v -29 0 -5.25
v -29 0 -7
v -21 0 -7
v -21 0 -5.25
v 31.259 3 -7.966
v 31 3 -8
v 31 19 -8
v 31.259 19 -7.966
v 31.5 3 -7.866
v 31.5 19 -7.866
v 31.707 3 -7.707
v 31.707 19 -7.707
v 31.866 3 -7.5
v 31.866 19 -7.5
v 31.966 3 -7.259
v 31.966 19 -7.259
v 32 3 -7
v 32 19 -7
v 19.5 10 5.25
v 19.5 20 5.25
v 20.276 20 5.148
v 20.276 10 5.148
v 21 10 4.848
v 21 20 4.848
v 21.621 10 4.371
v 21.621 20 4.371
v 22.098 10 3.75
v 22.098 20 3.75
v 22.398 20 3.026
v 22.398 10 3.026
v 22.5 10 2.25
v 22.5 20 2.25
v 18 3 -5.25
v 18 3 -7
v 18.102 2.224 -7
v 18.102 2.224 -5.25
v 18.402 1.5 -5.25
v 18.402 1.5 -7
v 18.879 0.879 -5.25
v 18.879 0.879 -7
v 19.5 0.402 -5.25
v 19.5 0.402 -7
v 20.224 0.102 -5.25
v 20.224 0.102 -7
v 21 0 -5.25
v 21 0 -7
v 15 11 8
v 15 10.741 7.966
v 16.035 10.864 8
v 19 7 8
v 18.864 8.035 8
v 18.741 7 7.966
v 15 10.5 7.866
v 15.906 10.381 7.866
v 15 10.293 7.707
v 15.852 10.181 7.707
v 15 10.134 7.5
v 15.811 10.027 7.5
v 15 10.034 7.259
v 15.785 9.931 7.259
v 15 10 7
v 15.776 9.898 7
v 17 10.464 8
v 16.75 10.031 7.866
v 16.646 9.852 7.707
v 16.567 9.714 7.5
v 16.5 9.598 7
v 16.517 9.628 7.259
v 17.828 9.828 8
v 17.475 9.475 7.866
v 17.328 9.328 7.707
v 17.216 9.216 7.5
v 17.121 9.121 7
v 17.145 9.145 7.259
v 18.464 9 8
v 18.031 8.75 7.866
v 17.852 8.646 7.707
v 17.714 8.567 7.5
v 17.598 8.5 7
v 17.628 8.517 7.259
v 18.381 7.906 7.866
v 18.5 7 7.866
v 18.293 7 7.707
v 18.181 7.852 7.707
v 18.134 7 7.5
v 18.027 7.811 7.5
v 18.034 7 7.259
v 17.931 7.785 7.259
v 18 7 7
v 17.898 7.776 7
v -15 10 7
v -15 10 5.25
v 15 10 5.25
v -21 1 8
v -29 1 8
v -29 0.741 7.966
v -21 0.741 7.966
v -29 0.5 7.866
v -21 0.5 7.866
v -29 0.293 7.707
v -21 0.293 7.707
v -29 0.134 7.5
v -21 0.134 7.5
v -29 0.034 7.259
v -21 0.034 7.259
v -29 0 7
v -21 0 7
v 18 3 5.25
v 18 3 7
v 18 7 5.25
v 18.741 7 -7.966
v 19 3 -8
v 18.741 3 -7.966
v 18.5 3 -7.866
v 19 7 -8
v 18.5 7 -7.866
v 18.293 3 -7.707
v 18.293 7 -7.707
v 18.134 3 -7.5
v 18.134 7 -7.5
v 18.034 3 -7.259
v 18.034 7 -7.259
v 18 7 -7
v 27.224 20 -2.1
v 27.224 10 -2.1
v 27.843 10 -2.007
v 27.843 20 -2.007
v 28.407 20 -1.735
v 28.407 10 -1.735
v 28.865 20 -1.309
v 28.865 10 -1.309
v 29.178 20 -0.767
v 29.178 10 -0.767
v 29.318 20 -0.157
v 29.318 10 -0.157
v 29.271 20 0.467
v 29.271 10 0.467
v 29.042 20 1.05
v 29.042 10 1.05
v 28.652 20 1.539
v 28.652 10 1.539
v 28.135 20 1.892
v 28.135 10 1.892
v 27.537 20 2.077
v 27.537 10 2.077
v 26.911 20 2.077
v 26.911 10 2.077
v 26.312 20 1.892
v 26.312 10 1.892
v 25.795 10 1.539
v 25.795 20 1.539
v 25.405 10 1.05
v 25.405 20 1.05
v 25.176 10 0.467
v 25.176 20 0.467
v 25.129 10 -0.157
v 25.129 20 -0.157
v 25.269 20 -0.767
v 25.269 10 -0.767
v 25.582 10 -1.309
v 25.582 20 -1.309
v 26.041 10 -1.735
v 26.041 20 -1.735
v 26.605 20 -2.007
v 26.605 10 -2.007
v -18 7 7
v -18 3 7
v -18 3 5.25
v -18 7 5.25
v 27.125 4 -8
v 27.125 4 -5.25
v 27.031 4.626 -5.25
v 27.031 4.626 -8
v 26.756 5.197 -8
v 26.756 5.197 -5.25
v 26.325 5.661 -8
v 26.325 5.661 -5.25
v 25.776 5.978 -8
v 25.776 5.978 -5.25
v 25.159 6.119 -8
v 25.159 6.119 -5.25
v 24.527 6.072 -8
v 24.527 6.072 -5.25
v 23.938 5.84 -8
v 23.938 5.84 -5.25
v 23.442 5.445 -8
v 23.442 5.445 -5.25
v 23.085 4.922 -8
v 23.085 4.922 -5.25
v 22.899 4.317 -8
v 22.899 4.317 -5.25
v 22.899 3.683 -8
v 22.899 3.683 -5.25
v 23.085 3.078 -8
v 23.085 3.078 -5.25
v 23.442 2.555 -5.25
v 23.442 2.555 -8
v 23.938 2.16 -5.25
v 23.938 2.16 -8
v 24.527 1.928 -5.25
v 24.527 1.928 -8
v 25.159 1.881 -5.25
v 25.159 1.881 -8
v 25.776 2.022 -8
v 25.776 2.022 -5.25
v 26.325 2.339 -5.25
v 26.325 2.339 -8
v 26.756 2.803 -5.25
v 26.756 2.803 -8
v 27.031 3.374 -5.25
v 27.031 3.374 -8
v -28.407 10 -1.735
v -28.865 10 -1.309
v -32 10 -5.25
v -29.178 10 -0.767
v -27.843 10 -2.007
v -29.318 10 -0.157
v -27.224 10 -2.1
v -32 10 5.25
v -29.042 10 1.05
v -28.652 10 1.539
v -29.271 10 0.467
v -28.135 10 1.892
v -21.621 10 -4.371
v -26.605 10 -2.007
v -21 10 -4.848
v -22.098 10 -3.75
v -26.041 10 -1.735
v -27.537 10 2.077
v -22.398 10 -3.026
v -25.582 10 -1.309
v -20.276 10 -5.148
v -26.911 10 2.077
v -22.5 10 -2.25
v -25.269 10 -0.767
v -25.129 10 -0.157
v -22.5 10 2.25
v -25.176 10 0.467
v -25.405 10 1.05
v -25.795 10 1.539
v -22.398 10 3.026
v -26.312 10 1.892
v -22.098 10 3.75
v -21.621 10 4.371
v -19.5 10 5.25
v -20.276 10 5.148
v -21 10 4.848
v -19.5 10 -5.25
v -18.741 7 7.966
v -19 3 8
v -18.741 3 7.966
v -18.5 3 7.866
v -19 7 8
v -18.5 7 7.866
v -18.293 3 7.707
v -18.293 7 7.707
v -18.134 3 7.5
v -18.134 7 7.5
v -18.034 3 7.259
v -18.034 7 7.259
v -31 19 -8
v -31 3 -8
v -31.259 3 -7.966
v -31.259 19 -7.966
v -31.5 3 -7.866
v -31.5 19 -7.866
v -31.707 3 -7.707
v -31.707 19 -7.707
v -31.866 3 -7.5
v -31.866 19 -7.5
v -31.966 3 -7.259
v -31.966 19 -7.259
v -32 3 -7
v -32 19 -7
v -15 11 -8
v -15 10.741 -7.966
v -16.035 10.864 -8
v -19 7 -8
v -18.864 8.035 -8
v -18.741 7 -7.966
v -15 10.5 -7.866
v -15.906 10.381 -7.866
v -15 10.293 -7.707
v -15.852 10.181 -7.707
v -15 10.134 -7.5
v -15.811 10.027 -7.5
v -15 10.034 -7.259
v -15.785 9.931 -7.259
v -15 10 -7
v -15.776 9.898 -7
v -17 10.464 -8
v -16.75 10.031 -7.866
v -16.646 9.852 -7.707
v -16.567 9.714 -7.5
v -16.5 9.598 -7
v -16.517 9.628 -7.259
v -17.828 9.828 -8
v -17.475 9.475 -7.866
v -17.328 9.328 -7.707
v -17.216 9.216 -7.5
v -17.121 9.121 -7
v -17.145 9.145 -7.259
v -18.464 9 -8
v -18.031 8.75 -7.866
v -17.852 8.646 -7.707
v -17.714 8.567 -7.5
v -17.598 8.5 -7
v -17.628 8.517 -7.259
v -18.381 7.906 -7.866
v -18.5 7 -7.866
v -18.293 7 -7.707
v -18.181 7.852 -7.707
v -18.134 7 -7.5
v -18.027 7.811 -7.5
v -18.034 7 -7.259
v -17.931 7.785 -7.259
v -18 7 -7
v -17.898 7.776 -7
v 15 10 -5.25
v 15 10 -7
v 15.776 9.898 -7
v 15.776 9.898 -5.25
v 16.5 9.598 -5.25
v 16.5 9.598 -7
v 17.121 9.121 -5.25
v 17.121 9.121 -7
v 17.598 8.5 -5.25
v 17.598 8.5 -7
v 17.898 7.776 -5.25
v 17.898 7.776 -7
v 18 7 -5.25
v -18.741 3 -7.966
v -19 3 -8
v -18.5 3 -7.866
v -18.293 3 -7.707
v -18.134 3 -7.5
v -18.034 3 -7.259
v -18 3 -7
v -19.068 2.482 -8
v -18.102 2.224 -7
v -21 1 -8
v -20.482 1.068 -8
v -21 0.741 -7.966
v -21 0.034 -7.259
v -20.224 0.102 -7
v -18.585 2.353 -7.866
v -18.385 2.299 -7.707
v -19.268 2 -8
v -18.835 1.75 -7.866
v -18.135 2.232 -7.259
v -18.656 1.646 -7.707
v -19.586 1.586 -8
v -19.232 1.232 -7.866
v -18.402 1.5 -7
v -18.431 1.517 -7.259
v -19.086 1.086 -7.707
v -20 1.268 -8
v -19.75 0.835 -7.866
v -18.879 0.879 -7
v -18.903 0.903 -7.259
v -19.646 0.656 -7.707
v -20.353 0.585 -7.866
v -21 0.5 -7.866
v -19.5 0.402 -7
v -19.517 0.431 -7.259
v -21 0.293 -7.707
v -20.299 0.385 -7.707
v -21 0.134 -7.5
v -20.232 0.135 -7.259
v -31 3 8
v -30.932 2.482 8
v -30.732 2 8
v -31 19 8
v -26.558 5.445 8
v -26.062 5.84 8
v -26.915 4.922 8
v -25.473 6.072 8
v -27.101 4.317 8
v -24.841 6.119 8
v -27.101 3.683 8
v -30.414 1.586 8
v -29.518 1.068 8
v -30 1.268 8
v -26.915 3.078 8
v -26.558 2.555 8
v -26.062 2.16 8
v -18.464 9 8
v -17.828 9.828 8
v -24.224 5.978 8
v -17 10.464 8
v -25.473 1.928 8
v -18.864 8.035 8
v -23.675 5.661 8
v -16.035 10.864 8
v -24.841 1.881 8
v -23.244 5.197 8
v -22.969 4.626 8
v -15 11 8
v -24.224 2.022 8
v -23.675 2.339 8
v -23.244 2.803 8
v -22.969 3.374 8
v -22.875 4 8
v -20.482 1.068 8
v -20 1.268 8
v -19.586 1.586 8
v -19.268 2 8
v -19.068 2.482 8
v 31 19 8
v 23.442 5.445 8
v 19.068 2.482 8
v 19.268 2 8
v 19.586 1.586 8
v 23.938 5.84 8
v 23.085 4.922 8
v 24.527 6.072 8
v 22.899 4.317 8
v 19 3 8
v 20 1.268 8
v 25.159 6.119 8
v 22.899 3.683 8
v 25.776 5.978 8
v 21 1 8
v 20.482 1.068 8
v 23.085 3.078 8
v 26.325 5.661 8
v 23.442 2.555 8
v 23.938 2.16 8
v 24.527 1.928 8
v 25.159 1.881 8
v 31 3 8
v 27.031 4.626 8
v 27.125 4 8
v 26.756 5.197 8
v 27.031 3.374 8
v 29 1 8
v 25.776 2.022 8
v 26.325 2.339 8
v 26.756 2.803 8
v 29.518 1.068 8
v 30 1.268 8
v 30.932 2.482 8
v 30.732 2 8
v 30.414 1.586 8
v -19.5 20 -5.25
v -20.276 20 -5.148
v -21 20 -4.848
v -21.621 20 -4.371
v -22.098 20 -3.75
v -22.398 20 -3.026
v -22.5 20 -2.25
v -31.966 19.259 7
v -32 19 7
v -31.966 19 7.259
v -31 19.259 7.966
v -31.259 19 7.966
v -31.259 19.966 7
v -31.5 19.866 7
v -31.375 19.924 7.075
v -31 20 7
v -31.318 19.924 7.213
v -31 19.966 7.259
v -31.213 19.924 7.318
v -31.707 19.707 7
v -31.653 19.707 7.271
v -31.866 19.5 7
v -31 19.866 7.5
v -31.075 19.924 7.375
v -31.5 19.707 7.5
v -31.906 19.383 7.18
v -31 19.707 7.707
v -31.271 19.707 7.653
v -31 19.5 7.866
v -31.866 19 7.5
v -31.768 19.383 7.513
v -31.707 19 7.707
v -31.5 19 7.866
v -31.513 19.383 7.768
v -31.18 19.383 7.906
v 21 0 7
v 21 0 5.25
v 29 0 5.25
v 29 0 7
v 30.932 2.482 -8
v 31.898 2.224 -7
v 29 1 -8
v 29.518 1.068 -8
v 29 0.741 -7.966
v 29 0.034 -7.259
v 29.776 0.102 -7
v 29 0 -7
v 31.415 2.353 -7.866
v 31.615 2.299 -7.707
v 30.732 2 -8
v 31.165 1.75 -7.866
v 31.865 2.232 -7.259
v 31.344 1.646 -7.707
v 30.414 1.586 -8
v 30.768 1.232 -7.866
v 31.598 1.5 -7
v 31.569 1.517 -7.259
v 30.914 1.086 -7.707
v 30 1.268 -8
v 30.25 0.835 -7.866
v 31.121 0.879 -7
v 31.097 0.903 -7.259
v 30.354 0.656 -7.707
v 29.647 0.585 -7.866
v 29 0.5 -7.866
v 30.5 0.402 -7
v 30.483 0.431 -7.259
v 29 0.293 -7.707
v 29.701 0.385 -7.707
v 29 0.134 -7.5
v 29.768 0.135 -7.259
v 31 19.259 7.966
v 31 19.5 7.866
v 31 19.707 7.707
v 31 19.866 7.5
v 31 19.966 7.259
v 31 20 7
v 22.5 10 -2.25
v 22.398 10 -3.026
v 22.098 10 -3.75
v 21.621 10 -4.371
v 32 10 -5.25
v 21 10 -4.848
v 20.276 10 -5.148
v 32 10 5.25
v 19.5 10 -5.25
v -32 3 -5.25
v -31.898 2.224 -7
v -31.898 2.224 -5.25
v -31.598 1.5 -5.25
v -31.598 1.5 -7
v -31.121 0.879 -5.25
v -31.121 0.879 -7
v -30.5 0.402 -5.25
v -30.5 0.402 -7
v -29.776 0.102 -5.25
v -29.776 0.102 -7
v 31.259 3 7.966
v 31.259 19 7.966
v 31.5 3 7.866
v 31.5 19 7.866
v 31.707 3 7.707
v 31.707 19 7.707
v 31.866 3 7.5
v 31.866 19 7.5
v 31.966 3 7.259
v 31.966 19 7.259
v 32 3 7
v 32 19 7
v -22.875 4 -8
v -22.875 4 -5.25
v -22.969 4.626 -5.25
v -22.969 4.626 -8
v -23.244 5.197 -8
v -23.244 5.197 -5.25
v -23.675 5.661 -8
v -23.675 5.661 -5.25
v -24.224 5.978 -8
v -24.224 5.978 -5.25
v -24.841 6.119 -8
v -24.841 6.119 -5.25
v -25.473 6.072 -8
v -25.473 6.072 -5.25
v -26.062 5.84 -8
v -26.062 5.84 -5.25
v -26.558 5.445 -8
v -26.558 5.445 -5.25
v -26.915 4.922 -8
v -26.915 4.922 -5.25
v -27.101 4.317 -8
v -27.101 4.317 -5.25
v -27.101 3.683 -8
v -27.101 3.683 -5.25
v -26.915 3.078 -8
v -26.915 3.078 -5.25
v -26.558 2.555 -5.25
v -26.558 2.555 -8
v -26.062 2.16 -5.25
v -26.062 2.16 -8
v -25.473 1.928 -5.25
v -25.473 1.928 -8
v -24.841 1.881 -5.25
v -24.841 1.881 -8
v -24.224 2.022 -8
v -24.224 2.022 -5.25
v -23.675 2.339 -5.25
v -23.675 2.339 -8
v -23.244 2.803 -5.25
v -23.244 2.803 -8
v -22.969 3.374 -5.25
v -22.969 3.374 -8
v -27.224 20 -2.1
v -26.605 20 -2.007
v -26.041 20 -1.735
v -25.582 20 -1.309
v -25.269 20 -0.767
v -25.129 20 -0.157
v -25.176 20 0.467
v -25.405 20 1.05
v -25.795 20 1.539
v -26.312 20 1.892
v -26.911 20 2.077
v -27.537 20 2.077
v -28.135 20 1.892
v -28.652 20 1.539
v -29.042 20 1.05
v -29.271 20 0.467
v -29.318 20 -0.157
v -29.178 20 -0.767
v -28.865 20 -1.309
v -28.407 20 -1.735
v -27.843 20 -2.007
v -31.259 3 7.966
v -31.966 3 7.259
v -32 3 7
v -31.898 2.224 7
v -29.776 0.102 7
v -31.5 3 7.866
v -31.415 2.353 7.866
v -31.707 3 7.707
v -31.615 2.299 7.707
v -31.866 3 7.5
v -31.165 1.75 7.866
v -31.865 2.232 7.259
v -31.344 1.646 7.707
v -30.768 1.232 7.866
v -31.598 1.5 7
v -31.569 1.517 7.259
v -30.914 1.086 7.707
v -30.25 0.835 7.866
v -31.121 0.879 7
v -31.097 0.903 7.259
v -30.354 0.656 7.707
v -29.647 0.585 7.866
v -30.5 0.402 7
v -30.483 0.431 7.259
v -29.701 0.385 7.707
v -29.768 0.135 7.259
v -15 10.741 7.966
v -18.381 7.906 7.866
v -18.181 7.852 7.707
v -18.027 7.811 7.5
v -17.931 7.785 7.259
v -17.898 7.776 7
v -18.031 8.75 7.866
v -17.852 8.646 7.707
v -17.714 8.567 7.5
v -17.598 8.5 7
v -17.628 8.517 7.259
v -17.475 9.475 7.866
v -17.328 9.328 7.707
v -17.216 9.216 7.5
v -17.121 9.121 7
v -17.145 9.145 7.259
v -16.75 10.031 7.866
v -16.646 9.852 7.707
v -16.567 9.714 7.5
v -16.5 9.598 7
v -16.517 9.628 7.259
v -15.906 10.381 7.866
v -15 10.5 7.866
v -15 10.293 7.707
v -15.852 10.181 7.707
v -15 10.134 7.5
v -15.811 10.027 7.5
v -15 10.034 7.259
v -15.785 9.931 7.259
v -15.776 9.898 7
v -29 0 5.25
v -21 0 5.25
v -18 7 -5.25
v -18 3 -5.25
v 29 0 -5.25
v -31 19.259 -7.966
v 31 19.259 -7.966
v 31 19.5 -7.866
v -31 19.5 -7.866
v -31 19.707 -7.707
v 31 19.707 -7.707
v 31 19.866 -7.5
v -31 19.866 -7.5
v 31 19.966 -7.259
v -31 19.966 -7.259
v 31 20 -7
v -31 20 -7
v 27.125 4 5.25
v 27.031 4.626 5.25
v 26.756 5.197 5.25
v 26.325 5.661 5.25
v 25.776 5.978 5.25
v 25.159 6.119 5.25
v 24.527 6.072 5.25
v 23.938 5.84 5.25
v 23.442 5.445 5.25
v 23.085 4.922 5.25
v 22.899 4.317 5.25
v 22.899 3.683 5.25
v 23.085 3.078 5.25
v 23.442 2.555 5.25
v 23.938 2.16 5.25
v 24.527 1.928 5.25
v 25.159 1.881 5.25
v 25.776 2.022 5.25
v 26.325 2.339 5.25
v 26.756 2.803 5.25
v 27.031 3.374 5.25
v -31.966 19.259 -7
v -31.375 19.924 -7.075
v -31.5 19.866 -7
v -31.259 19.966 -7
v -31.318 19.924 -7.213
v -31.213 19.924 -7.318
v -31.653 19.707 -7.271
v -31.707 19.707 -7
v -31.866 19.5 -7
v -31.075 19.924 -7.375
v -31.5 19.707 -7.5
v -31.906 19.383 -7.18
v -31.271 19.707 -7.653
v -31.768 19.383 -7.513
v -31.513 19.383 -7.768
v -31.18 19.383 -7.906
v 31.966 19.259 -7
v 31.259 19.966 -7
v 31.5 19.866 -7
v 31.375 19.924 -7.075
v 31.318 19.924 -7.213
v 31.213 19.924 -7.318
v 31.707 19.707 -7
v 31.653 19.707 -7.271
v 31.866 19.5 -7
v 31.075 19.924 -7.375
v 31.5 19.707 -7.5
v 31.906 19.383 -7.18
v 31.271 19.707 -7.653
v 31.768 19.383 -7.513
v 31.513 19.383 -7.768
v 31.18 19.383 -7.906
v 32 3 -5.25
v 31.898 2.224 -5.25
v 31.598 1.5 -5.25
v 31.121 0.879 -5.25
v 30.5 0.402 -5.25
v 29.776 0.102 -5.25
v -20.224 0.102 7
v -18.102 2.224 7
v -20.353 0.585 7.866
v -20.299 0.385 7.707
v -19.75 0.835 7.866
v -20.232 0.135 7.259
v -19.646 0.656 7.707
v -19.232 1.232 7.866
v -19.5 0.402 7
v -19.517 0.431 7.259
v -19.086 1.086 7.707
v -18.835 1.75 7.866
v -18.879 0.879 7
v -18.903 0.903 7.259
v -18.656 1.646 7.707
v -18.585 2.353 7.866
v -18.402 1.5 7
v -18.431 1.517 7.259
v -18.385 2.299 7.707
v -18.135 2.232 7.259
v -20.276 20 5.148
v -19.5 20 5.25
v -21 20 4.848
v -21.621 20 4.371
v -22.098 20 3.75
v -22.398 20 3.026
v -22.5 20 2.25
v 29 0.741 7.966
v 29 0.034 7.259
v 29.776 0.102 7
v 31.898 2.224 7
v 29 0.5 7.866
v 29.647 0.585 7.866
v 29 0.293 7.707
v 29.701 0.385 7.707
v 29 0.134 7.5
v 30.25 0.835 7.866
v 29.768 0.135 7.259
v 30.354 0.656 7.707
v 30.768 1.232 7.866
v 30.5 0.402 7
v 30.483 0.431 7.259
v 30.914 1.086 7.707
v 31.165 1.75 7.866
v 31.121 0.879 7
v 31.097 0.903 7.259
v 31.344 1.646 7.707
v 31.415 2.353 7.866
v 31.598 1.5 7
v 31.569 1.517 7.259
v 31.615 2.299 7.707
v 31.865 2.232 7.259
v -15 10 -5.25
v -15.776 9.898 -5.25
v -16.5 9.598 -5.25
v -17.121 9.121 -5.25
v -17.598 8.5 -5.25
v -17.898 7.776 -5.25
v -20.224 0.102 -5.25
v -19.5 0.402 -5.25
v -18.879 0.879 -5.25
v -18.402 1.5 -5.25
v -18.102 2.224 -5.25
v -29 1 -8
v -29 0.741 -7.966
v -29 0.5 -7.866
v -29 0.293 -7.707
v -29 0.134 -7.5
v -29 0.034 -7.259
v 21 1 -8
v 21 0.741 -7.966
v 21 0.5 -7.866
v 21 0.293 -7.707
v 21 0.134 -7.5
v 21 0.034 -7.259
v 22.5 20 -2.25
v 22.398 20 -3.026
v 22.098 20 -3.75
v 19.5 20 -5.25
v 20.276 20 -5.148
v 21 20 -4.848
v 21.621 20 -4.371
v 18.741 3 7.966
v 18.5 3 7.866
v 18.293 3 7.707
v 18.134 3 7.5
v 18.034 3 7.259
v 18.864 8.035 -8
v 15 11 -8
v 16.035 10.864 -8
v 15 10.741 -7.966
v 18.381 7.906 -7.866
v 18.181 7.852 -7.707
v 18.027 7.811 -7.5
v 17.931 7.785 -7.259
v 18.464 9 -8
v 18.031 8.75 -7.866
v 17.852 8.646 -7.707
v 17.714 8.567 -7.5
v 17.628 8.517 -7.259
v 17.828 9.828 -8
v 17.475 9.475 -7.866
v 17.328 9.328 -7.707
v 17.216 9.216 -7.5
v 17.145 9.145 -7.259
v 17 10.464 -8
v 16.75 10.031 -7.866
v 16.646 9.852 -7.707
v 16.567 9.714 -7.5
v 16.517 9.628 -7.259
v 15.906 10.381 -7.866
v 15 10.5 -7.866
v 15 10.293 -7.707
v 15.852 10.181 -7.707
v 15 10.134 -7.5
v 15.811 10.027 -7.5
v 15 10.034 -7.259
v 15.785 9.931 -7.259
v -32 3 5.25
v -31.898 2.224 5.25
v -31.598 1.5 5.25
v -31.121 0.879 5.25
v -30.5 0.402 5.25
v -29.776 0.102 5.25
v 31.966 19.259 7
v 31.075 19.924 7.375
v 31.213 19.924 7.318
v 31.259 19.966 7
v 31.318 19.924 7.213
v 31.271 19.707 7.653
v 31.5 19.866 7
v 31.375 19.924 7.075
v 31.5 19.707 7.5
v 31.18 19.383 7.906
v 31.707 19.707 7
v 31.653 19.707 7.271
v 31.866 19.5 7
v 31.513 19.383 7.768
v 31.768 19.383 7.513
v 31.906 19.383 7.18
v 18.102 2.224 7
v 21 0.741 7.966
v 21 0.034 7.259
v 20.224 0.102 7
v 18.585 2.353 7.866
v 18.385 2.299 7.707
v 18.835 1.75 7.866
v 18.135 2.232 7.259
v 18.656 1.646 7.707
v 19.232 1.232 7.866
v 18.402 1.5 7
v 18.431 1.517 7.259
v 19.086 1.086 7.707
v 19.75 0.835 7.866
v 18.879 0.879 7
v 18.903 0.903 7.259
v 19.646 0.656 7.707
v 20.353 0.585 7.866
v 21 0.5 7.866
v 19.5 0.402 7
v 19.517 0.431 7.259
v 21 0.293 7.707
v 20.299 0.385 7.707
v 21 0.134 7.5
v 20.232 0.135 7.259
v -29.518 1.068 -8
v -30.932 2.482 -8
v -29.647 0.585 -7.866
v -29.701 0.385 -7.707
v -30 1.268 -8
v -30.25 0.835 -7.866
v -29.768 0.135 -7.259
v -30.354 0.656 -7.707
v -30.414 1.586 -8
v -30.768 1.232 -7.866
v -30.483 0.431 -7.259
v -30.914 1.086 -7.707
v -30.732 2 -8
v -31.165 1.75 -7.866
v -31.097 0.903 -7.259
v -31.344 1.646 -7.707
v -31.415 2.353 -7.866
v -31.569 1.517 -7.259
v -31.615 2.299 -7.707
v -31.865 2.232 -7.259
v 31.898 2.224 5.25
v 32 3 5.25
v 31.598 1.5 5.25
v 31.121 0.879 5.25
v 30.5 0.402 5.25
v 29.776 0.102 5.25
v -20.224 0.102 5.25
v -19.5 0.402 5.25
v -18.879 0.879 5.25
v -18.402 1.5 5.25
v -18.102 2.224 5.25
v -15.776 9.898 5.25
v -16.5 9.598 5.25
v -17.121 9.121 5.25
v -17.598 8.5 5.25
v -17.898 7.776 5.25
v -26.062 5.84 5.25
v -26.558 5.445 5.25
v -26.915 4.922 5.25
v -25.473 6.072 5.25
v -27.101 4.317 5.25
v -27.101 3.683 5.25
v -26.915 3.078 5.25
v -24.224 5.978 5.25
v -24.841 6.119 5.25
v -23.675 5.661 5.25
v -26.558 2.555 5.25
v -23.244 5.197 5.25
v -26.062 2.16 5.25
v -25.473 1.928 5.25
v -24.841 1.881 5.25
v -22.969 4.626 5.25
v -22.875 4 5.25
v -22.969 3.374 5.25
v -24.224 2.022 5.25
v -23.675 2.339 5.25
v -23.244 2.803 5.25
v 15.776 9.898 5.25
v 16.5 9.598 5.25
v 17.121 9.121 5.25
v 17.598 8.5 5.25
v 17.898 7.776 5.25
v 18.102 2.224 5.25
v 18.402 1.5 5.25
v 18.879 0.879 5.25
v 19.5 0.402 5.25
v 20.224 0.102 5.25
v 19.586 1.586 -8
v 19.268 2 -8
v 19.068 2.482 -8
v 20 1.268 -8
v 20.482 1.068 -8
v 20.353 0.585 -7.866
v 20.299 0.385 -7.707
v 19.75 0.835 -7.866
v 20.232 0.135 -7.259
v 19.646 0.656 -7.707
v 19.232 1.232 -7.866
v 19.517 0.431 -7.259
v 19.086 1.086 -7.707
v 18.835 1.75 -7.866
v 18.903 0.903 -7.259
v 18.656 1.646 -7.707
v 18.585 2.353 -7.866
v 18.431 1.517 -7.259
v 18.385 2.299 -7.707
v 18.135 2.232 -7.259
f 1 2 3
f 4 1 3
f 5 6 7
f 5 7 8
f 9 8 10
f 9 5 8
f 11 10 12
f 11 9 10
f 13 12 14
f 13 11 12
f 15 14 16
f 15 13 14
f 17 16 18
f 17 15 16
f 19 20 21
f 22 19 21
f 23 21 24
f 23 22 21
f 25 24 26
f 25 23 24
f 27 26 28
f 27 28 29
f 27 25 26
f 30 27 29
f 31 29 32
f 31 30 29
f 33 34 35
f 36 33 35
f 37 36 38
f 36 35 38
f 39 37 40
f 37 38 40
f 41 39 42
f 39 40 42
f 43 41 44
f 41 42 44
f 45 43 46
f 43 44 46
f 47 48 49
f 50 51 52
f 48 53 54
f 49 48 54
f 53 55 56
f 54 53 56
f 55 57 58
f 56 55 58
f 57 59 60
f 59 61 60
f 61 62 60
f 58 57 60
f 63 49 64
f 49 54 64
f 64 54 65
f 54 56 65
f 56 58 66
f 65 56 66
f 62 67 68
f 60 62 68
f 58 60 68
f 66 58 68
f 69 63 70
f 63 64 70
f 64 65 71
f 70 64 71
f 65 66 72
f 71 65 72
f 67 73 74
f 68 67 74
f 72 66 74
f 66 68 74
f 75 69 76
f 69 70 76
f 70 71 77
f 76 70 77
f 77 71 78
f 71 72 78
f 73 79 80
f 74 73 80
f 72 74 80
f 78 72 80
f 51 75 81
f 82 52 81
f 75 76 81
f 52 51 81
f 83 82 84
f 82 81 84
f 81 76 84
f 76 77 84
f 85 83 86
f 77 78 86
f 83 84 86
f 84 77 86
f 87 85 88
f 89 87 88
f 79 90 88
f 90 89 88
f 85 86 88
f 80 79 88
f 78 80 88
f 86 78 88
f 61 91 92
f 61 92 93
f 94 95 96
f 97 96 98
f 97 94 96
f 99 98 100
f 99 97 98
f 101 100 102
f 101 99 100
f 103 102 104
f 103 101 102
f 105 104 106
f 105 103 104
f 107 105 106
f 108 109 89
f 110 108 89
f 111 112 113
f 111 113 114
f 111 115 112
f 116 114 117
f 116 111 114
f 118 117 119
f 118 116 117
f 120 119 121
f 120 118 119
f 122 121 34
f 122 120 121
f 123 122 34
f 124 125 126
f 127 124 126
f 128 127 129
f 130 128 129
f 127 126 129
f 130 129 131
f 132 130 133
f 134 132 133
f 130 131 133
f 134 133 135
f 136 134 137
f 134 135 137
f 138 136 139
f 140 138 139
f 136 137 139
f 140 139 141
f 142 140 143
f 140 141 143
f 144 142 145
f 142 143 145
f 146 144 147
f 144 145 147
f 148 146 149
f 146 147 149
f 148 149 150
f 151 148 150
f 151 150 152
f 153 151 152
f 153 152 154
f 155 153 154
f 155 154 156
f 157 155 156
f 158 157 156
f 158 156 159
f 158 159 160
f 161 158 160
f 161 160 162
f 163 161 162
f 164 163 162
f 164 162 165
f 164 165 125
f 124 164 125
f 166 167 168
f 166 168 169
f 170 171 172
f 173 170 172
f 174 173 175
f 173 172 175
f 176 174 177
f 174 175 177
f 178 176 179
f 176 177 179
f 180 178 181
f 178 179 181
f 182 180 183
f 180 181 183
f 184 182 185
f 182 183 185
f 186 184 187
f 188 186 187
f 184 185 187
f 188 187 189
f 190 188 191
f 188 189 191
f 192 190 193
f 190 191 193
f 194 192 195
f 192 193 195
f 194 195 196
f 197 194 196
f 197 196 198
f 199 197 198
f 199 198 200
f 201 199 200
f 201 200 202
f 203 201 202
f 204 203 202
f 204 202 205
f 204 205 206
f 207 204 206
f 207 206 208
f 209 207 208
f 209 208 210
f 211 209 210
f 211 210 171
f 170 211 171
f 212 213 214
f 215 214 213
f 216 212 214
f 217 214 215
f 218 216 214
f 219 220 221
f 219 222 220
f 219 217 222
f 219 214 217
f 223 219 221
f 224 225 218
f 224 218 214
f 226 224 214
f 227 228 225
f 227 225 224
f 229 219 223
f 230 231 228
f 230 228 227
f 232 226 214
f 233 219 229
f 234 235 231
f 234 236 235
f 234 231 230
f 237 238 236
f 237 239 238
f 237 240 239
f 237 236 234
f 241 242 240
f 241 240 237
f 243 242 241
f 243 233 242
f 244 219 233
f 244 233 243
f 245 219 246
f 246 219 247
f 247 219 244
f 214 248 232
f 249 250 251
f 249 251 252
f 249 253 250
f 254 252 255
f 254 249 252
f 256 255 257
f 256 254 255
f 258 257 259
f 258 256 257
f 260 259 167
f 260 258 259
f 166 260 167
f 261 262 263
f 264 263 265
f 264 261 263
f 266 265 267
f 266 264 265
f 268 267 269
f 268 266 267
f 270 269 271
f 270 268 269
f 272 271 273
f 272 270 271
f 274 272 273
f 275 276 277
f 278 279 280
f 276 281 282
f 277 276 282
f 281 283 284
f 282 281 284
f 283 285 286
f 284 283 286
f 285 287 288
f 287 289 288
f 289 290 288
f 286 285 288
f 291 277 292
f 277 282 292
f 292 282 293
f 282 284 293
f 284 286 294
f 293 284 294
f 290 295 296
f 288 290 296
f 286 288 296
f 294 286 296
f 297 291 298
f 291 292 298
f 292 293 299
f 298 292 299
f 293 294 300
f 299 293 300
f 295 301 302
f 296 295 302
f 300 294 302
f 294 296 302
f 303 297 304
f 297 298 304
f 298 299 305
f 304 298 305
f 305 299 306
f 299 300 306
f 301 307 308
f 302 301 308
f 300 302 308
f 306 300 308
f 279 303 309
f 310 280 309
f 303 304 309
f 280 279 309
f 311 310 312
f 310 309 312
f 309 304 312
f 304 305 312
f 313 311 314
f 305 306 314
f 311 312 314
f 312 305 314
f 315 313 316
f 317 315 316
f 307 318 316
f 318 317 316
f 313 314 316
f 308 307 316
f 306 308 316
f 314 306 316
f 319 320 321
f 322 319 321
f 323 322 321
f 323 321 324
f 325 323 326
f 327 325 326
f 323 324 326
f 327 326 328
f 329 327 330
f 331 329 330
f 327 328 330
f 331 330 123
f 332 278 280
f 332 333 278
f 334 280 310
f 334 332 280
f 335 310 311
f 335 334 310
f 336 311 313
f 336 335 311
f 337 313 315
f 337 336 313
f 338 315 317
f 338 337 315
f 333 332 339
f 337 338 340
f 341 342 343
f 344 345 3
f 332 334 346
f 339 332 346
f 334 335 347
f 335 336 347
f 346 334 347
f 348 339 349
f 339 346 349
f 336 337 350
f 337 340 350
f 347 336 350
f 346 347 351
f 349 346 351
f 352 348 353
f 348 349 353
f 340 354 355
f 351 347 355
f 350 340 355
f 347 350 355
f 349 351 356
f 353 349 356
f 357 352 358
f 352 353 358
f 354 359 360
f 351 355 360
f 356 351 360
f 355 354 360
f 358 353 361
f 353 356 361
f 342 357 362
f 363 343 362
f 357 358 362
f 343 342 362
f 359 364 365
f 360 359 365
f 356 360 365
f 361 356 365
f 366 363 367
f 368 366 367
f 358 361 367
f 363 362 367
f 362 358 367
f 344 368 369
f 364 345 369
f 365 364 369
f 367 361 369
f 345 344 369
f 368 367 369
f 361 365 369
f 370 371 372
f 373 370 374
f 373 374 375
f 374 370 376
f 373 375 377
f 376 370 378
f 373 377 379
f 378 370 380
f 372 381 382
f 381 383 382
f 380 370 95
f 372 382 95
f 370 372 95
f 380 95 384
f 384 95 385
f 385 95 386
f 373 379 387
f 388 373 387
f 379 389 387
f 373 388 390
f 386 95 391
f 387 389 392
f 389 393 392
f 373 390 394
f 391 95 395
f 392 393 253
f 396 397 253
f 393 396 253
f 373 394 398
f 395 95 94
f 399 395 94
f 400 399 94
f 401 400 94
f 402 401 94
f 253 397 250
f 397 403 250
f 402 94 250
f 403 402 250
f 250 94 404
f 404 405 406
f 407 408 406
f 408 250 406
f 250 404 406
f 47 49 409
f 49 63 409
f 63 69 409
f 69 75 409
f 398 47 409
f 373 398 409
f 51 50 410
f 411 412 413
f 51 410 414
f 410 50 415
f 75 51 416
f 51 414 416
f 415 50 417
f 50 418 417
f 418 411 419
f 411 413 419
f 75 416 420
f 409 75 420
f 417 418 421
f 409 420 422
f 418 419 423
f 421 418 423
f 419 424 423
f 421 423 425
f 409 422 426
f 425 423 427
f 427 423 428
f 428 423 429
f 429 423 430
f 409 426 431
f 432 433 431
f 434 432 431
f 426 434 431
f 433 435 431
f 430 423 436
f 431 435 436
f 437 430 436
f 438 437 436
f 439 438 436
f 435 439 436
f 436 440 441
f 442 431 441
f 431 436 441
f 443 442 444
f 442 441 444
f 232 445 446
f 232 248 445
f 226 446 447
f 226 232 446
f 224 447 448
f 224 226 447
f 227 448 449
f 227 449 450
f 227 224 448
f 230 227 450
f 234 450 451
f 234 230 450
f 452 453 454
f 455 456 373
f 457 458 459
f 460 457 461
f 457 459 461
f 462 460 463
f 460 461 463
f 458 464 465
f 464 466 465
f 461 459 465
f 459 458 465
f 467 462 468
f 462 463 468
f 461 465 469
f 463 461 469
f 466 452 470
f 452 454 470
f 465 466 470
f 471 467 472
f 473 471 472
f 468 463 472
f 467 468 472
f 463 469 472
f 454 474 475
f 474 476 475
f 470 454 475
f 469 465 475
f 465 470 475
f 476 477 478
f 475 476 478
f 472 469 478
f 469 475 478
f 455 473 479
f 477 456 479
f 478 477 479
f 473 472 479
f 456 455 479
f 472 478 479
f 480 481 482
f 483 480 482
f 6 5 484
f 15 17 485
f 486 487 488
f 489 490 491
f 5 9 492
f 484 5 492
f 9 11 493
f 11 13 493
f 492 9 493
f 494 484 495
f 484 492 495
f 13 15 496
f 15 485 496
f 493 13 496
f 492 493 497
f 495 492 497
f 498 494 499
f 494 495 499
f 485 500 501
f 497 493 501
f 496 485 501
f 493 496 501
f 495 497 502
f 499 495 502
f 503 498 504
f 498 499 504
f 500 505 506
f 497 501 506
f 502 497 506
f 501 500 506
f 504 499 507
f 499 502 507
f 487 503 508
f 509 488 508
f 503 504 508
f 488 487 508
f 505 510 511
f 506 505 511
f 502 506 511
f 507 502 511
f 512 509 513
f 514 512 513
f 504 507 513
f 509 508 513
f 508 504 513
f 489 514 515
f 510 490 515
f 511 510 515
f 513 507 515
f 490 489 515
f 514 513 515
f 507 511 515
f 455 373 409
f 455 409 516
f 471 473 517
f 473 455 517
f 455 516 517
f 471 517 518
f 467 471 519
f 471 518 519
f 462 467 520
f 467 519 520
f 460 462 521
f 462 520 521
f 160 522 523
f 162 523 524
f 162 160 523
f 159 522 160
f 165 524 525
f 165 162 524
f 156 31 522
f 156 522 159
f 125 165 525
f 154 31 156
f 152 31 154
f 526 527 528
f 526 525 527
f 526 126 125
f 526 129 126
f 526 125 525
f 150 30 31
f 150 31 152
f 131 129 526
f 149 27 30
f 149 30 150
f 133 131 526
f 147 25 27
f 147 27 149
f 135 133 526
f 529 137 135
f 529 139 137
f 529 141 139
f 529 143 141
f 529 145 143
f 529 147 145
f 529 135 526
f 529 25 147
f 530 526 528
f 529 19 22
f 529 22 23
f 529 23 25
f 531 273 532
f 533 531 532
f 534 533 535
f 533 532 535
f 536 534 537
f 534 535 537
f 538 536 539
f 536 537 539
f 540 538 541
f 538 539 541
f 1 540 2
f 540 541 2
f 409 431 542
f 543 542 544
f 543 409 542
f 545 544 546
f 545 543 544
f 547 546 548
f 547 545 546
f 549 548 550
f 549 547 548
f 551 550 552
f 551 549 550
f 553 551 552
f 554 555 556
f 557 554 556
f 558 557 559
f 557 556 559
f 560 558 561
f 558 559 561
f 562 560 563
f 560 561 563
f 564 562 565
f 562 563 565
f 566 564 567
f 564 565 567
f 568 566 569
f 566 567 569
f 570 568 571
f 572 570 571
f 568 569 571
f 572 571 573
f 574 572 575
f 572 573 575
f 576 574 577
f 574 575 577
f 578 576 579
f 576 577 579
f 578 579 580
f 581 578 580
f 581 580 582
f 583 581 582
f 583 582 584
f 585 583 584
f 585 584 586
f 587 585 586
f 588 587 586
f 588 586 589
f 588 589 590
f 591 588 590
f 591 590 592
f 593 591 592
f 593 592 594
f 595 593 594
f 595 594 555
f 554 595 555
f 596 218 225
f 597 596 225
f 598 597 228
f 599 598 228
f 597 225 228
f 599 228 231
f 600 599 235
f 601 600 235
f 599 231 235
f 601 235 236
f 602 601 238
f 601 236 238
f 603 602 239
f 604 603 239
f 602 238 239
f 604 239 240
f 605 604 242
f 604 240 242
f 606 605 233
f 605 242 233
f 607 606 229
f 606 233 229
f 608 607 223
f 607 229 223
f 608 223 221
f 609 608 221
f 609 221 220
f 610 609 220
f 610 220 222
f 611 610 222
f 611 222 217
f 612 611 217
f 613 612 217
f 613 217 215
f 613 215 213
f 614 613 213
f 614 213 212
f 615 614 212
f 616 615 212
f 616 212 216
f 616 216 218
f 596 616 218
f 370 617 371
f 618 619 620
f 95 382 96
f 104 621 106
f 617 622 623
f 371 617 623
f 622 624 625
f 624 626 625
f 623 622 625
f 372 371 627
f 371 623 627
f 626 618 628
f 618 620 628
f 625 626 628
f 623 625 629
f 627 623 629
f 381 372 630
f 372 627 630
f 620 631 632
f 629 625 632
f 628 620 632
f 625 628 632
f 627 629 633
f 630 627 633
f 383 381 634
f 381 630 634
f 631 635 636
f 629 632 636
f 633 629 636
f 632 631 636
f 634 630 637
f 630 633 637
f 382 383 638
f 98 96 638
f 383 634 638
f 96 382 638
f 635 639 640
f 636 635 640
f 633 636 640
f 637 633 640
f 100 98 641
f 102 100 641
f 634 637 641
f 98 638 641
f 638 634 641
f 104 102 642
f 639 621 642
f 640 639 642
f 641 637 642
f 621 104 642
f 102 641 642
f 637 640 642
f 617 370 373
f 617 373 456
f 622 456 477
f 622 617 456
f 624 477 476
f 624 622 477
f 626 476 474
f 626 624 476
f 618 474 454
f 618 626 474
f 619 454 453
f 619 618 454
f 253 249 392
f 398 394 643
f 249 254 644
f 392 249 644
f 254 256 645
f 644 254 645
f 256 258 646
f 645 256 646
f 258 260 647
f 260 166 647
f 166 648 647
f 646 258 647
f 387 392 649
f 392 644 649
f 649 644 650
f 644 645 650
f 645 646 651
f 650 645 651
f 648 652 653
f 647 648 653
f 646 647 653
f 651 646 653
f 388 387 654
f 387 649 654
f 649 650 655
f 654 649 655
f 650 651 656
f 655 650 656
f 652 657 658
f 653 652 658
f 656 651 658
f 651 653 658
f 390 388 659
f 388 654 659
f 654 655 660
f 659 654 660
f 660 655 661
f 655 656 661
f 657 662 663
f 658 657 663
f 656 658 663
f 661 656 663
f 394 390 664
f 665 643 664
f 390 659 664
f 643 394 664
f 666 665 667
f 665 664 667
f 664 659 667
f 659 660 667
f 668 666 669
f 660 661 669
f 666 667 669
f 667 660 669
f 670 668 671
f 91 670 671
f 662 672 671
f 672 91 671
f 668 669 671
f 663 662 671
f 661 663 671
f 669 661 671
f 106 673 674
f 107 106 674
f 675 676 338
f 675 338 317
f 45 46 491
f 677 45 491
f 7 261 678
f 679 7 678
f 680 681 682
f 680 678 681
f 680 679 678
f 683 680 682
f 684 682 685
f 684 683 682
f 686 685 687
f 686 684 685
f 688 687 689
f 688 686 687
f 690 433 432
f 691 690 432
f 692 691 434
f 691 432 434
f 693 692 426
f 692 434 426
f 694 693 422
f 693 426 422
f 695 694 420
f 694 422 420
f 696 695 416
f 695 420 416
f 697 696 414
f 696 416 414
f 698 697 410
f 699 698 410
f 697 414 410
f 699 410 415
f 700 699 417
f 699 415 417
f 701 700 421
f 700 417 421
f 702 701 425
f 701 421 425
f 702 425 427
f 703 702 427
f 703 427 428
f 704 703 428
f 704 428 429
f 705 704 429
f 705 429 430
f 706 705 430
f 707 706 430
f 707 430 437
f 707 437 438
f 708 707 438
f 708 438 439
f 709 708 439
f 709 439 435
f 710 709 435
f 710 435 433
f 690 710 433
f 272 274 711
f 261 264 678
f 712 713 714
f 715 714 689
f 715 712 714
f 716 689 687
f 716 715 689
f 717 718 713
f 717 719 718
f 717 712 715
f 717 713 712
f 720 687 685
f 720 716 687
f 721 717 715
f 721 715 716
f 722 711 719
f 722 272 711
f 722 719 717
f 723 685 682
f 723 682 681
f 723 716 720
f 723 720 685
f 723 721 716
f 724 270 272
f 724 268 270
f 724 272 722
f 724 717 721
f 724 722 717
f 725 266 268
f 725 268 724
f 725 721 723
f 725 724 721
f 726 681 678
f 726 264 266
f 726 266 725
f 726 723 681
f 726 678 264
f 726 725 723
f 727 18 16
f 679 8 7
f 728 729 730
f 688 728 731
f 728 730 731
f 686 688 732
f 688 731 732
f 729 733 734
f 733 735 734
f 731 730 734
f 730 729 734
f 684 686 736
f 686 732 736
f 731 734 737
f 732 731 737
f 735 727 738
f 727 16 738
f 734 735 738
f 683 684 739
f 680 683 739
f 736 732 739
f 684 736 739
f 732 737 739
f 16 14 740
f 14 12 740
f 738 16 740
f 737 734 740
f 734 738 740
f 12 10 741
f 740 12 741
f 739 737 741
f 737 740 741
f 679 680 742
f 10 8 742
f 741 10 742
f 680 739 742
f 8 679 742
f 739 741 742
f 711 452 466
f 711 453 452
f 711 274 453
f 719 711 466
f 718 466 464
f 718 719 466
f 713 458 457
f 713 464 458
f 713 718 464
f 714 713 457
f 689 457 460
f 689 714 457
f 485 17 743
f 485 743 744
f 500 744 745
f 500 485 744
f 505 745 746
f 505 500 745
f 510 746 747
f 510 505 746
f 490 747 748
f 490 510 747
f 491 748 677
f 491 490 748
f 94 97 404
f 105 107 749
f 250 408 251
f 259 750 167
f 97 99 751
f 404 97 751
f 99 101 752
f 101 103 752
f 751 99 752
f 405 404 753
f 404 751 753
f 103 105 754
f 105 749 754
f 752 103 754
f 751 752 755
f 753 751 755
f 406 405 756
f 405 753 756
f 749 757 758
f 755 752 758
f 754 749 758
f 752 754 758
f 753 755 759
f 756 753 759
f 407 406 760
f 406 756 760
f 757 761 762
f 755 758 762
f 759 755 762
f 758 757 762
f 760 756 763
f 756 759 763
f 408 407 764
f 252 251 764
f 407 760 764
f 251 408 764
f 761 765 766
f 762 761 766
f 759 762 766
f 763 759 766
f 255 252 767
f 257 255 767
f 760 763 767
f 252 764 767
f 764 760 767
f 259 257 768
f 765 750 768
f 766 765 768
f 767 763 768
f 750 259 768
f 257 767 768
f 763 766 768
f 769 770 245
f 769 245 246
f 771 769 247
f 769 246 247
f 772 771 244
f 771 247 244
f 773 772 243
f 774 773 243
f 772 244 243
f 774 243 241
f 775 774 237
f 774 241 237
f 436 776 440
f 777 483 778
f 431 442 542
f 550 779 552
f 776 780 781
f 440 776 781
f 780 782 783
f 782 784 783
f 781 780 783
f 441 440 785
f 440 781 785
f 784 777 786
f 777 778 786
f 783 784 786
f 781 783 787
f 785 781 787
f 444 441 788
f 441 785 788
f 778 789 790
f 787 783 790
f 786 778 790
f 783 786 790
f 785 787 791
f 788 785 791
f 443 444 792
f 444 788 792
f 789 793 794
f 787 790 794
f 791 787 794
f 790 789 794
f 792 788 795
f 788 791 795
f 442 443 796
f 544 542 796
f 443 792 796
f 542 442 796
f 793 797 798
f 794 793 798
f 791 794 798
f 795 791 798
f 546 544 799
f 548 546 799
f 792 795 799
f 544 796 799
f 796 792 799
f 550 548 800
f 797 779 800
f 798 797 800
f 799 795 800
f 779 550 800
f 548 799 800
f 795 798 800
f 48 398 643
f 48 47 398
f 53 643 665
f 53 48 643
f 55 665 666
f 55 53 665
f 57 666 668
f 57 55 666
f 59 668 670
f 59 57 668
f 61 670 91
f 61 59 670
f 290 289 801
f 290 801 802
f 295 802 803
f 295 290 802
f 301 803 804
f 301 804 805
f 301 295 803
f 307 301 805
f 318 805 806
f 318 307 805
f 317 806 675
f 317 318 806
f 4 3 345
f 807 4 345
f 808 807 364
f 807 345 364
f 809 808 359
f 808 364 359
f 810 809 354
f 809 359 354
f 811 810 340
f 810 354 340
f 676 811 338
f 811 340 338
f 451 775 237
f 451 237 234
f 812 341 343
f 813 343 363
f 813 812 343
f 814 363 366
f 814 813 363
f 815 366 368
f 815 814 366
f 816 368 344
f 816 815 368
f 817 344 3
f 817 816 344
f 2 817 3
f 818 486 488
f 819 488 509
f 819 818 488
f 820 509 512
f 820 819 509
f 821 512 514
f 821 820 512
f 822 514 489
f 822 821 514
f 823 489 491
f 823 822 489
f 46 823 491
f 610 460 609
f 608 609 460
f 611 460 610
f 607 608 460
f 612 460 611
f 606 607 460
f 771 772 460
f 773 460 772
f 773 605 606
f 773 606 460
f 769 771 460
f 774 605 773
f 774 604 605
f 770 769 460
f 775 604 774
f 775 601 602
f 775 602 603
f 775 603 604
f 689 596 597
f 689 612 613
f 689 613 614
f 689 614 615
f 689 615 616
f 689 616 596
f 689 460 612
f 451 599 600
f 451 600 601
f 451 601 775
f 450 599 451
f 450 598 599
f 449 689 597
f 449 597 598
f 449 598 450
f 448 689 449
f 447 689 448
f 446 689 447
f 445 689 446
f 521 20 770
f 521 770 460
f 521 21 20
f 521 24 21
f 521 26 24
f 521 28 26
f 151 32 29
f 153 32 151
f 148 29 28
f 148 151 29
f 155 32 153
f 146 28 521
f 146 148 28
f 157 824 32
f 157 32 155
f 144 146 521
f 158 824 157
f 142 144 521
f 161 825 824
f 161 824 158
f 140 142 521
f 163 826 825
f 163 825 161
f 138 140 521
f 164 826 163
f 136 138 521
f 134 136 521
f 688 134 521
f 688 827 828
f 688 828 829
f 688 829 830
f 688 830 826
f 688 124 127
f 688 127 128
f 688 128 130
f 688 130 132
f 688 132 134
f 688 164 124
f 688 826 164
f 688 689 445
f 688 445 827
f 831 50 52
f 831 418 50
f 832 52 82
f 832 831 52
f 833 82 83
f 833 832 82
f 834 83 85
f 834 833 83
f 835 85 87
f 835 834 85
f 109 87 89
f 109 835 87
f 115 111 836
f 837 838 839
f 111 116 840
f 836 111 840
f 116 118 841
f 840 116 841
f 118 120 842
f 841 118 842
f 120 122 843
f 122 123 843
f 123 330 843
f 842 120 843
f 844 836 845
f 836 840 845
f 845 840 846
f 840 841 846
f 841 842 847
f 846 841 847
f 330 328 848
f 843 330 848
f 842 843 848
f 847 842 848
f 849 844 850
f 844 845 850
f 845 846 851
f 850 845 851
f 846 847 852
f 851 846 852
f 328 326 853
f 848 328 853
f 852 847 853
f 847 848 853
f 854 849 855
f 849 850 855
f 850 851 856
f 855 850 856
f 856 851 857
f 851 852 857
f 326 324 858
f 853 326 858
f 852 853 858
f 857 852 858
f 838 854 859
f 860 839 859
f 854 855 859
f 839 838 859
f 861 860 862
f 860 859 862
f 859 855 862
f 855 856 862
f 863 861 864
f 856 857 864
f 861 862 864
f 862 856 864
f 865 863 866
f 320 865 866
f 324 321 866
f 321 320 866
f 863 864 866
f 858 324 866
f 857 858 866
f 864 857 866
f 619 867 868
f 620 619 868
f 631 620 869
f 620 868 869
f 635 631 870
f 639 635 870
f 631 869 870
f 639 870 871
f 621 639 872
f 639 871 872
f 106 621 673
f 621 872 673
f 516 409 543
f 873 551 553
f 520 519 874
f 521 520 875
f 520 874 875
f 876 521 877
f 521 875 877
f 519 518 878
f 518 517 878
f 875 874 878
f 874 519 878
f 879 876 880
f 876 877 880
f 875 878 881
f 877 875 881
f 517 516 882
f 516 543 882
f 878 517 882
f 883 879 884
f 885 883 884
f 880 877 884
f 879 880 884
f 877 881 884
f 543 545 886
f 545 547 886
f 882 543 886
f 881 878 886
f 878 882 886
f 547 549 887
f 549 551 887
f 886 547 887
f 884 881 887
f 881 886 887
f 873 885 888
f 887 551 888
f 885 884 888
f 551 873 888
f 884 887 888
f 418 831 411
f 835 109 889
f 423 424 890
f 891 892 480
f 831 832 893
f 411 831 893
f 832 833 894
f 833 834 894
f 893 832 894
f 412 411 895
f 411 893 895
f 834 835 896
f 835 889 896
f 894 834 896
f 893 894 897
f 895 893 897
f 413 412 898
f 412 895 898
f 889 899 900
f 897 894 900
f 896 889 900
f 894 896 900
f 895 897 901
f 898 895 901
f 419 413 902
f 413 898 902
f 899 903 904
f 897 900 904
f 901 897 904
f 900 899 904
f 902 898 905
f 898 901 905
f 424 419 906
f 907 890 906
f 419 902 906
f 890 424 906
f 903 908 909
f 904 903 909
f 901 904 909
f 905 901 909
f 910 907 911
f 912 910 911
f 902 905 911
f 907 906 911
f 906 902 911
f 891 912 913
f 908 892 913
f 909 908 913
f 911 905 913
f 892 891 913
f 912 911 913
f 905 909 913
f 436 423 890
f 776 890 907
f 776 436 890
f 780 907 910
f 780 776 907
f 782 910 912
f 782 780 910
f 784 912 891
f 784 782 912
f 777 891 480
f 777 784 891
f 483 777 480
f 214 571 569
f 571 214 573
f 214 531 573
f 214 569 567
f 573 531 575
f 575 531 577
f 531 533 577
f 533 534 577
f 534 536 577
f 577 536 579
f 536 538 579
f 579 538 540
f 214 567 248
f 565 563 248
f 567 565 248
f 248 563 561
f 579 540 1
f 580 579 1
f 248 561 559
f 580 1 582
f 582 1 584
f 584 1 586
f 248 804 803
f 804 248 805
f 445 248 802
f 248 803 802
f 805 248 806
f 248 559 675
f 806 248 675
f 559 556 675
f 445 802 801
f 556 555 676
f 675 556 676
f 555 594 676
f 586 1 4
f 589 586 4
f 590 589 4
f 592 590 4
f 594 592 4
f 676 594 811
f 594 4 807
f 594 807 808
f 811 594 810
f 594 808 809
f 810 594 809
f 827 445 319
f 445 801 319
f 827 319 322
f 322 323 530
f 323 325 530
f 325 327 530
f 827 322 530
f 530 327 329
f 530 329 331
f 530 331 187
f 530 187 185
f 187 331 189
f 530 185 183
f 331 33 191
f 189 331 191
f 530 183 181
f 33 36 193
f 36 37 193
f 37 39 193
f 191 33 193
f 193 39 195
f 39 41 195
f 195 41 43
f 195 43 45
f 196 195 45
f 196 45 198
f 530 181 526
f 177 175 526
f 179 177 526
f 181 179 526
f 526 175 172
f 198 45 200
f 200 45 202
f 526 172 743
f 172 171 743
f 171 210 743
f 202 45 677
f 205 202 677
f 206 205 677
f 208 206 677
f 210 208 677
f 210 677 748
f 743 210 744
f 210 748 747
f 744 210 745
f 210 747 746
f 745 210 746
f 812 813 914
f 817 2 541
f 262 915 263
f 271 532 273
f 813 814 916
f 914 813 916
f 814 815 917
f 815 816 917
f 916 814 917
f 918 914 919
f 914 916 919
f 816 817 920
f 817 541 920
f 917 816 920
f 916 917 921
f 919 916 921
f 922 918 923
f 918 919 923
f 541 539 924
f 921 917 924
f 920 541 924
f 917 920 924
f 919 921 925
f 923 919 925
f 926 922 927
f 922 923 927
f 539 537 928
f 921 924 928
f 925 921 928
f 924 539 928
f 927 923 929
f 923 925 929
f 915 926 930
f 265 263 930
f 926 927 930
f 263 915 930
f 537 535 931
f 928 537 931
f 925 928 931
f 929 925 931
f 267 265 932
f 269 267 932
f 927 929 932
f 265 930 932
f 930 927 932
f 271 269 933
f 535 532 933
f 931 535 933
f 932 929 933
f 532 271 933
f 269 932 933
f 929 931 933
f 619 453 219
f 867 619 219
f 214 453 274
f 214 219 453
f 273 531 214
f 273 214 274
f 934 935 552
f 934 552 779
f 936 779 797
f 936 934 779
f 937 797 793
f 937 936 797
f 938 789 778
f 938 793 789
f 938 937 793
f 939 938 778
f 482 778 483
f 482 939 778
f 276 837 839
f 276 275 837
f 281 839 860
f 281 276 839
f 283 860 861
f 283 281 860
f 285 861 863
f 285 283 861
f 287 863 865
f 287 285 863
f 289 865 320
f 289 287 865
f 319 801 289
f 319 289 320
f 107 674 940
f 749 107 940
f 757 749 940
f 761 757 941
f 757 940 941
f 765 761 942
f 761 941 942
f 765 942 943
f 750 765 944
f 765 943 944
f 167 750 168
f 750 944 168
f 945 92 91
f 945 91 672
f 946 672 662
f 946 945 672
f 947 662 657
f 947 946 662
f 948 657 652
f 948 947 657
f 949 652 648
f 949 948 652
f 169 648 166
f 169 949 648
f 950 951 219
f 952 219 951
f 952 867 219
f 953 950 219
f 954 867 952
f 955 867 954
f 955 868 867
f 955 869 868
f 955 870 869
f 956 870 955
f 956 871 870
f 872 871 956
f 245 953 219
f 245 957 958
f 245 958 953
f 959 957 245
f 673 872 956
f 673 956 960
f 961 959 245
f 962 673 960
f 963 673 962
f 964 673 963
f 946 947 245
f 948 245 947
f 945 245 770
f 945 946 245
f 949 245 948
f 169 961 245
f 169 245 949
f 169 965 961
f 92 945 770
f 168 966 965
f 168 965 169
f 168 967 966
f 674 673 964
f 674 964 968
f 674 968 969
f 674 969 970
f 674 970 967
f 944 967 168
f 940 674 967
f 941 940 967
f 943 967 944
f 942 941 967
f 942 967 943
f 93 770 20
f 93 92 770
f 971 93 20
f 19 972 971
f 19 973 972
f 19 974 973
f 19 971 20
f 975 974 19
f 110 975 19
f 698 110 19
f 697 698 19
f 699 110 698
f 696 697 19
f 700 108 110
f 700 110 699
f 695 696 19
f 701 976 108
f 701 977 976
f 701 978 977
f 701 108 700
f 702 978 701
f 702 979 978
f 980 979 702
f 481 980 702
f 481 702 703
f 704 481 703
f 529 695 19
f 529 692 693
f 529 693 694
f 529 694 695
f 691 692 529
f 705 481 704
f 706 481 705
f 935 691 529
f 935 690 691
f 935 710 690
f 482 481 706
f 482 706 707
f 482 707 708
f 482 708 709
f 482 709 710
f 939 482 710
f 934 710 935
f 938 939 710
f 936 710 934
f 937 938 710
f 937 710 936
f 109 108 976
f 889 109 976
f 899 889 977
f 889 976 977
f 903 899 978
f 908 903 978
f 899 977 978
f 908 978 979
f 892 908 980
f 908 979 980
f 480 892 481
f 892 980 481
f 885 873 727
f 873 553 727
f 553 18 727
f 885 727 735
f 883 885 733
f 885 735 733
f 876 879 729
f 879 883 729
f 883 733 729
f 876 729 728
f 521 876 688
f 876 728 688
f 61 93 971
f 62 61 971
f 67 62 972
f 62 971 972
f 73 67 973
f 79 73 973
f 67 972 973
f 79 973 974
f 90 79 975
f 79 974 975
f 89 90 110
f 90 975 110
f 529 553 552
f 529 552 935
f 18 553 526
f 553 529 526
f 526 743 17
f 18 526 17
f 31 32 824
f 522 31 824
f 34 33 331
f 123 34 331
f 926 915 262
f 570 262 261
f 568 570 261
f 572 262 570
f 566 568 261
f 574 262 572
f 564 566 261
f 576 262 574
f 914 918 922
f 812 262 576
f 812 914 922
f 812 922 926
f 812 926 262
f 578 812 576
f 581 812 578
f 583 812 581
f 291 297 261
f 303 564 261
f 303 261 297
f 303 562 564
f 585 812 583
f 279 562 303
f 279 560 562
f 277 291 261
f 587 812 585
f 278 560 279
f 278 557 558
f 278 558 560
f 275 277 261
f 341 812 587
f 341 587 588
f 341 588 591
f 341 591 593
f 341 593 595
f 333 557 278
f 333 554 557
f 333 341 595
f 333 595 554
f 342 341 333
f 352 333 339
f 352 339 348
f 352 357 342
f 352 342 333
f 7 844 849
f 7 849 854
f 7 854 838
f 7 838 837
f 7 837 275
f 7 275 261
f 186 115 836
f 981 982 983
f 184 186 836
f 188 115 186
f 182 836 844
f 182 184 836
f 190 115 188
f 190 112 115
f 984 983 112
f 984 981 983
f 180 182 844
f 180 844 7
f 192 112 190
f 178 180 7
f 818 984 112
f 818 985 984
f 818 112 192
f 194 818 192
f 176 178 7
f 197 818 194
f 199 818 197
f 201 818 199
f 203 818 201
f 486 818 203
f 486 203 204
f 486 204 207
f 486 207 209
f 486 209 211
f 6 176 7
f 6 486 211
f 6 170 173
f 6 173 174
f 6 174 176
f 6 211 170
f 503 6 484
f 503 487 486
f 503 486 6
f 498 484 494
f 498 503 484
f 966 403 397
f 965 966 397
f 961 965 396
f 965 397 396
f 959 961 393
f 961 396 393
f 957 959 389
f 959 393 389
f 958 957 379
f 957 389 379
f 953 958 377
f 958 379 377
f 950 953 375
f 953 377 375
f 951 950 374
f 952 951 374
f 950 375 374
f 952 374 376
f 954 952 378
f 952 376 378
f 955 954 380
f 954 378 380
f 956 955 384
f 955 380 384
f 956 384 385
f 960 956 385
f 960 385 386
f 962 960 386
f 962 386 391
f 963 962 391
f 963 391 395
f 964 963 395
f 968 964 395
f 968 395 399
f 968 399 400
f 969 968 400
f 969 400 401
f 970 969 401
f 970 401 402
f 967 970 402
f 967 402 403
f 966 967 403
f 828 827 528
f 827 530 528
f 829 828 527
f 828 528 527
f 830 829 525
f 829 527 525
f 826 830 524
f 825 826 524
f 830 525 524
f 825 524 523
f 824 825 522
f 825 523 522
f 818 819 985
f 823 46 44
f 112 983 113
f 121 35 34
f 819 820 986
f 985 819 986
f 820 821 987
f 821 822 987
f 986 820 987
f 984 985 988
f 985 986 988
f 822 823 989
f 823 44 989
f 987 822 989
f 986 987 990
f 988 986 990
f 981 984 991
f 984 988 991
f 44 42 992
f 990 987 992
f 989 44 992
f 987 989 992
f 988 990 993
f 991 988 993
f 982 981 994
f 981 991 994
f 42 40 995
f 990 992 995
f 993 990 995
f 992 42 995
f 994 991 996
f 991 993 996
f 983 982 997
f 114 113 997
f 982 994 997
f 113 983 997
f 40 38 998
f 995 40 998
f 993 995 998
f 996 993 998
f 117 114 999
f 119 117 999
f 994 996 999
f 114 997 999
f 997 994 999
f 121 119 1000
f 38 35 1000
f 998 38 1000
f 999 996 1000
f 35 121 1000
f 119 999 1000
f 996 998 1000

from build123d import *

# Parameters (mm, degrees)
SKETCH_1_W             = 64
SKETCH_1_H             = 16
EXTRUDE_1_DEPTH        = 20
SKETCH_3_R             = 2.125
CUT_EXTRUDE_1_DEPTH    = 28
SKETCH_4_W             = 36
SKETCH_4_H             = 10
CUT_EXTRUDE_2_DEPTH    = 20
SKETCH_5_W             = 64
SKETCH_5_H             = 10.5
CUT_EXTRUDE_3_DEPTH    = 10
HOLE_WIZARD_M5_1_D     = 4.2
HOLE_WIZARD_M5_1_DEPTH = 12.4
HOLE_WIZARD_M5_1_TIP   = 1.2618073
FILLET_1_R             = 3
FILLET_2_R             = 3
SKETCH_7_W             = 45
SKETCH_7_H             = 10.5
CUT_EXTRUDE_4_DEPTH    = 10
FILLET_3_R             = 3
FILLET_4_R             = 1


with BuildPart() as part:
    # 草图1 → 凸台-拉伸1 (new body)
    with BuildSketch(Plane(origin=(0, 0, 0), x_dir=(1, 0, 0), z_dir=(0, 1, 0))):
        Rectangle(SKETCH_1_W, SKETCH_1_H)
    extrude(amount=EXTRUDE_1_DEPTH)

    # 草图3 → 切除-拉伸1 (cut)
    with BuildSketch(Plane.XY.offset(8)):
        with Locations((-25, 4)):
            Circle(SKETCH_3_R)
        with Locations((25, 4)):
            Circle(SKETCH_3_R)
    extrude(amount=-CUT_EXTRUDE_1_DEPTH, mode=Mode.SUBTRACT)

    # 草图4 → 切除-拉伸2 (cut)
    with BuildSketch(Plane.XY.offset(8)):
        with Locations((0, 5)):
            Rectangle(SKETCH_4_W, SKETCH_4_H)
    extrude(amount=-CUT_EXTRUDE_2_DEPTH, mode=Mode.SUBTRACT)

    # 草图5 → 切除-拉伸3 (cut)
    with BuildSketch(Plane.XZ):
        Rectangle(SKETCH_5_W, SKETCH_5_H)
    extrude(amount=-CUT_EXTRUDE_3_DEPTH, mode=Mode.SUBTRACT)

    # M5 螺纹孔1
    with Locations(Plane(origin=(27.223611076, 20, 0), x_dir=(0, 0, 1), z_dir=(0, 1, 0))):
        with Locations((0, 0), (0, -54.447222152)):
            Hole(HOLE_WIZARD_M5_1_D / 2, depth=HOLE_WIZARD_M5_1_DEPTH)
            with Locations((0, 0, -(HOLE_WIZARD_M5_1_DEPTH + HOLE_WIZARD_M5_1_TIP / 2))):  # 118° drill point
                Cone(0, HOLE_WIZARD_M5_1_D / 2, HOLE_WIZARD_M5_1_TIP, mode=Mode.SUBTRACT)

    # 圆角1
    fillet_1_edges = [part.edges().sort_by_distance(p)[0] for p in [
        (-18, 0, -6.625),
        (18, 0, 6.625),
        (-18, 0, 6.625),
        (18, 0, -6.625),
        (-32, 0, 6.625),
        (-32, 0, -6.625),
        (32, 0, -6.625),
        (32, 0, 6.625),
    ]]
    fillet(fillet_1_edges, radius=FILLET_1_R)

    # 圆角2
    fillet_2_edges = [part.edges().sort_by_distance(p)[0] for p in [
        (-18, 10, -6.625),
        (18, 10, -6.625),
        (-18, 10, 6.625),
        (18, 10, 6.625),
    ]]
    fillet(fillet_2_edges, radius=FILLET_2_R)

    # 草图7 → 切除-拉伸4 (cut)
    with BuildSketch(Plane(origin=(0, 20, 0), x_dir=(1, 0, 0), z_dir=(0, 1, 0))):
        Rectangle(SKETCH_7_W, SKETCH_7_H)
    extrude(amount=-CUT_EXTRUDE_4_DEPTH, mode=Mode.SUBTRACT)

    # 圆角3
    fillet_3_edges = [part.edges().sort_by_distance(p)[0] for p in [
        (22.5, 15, -5.25),
        (22.5, 15, 5.25),
        (-22.5, 15, 5.25),
        (-22.5, 15, -5.25),
    ]]
    fillet(fillet_3_edges, radius=FILLET_3_R)

    # 圆角4
    fillet_4_edges = [part.edges().sort_by_distance(p)[0] for p in [
        (31.121320344, 0.878679656, -8),
        (25, 0, 8),
        (18, 5, 8),
        (-25, 0, 8),
        (-18.878679656, 0.878679656, 8),
        (-31.121320344, 0.878679656, 8),
        (18.878679656, 0.878679656, 8),
        (31.121320344, 0.878679656, 8),
        (-32, 20, 0),
        (0, 10, -8),
        (0, 10, 8),
        (-18, 5, -8),
        (-18, 5, 8),
        (17.121320344, 9.121320344, -8),
        (17.121320344, 9.121320344, 8),
        (-17.121320344, 9.121320344, -8),
        (-17.121320344, 9.121320344, 8),
        (0, 20, 8),
        (32, 20, 0),
        (32, 11.5, 8),
        (-32, 11.5, 8),
        (-32, 11.5, -8),
        (32, 11.5, -8),
        (0, 20, -8),
        (25, 0, -8),
        (18, 5, -8),
        (-25, 0, -8),
        (-31.121320344, 0.878679656, -8),
        (-18.878679656, 0.878679656, -8),
        (18.878679656, 0.878679656, -8),
    ]]
    fillet(fillet_4_edges, radius=FILLET_4_R)


solid = part.part
